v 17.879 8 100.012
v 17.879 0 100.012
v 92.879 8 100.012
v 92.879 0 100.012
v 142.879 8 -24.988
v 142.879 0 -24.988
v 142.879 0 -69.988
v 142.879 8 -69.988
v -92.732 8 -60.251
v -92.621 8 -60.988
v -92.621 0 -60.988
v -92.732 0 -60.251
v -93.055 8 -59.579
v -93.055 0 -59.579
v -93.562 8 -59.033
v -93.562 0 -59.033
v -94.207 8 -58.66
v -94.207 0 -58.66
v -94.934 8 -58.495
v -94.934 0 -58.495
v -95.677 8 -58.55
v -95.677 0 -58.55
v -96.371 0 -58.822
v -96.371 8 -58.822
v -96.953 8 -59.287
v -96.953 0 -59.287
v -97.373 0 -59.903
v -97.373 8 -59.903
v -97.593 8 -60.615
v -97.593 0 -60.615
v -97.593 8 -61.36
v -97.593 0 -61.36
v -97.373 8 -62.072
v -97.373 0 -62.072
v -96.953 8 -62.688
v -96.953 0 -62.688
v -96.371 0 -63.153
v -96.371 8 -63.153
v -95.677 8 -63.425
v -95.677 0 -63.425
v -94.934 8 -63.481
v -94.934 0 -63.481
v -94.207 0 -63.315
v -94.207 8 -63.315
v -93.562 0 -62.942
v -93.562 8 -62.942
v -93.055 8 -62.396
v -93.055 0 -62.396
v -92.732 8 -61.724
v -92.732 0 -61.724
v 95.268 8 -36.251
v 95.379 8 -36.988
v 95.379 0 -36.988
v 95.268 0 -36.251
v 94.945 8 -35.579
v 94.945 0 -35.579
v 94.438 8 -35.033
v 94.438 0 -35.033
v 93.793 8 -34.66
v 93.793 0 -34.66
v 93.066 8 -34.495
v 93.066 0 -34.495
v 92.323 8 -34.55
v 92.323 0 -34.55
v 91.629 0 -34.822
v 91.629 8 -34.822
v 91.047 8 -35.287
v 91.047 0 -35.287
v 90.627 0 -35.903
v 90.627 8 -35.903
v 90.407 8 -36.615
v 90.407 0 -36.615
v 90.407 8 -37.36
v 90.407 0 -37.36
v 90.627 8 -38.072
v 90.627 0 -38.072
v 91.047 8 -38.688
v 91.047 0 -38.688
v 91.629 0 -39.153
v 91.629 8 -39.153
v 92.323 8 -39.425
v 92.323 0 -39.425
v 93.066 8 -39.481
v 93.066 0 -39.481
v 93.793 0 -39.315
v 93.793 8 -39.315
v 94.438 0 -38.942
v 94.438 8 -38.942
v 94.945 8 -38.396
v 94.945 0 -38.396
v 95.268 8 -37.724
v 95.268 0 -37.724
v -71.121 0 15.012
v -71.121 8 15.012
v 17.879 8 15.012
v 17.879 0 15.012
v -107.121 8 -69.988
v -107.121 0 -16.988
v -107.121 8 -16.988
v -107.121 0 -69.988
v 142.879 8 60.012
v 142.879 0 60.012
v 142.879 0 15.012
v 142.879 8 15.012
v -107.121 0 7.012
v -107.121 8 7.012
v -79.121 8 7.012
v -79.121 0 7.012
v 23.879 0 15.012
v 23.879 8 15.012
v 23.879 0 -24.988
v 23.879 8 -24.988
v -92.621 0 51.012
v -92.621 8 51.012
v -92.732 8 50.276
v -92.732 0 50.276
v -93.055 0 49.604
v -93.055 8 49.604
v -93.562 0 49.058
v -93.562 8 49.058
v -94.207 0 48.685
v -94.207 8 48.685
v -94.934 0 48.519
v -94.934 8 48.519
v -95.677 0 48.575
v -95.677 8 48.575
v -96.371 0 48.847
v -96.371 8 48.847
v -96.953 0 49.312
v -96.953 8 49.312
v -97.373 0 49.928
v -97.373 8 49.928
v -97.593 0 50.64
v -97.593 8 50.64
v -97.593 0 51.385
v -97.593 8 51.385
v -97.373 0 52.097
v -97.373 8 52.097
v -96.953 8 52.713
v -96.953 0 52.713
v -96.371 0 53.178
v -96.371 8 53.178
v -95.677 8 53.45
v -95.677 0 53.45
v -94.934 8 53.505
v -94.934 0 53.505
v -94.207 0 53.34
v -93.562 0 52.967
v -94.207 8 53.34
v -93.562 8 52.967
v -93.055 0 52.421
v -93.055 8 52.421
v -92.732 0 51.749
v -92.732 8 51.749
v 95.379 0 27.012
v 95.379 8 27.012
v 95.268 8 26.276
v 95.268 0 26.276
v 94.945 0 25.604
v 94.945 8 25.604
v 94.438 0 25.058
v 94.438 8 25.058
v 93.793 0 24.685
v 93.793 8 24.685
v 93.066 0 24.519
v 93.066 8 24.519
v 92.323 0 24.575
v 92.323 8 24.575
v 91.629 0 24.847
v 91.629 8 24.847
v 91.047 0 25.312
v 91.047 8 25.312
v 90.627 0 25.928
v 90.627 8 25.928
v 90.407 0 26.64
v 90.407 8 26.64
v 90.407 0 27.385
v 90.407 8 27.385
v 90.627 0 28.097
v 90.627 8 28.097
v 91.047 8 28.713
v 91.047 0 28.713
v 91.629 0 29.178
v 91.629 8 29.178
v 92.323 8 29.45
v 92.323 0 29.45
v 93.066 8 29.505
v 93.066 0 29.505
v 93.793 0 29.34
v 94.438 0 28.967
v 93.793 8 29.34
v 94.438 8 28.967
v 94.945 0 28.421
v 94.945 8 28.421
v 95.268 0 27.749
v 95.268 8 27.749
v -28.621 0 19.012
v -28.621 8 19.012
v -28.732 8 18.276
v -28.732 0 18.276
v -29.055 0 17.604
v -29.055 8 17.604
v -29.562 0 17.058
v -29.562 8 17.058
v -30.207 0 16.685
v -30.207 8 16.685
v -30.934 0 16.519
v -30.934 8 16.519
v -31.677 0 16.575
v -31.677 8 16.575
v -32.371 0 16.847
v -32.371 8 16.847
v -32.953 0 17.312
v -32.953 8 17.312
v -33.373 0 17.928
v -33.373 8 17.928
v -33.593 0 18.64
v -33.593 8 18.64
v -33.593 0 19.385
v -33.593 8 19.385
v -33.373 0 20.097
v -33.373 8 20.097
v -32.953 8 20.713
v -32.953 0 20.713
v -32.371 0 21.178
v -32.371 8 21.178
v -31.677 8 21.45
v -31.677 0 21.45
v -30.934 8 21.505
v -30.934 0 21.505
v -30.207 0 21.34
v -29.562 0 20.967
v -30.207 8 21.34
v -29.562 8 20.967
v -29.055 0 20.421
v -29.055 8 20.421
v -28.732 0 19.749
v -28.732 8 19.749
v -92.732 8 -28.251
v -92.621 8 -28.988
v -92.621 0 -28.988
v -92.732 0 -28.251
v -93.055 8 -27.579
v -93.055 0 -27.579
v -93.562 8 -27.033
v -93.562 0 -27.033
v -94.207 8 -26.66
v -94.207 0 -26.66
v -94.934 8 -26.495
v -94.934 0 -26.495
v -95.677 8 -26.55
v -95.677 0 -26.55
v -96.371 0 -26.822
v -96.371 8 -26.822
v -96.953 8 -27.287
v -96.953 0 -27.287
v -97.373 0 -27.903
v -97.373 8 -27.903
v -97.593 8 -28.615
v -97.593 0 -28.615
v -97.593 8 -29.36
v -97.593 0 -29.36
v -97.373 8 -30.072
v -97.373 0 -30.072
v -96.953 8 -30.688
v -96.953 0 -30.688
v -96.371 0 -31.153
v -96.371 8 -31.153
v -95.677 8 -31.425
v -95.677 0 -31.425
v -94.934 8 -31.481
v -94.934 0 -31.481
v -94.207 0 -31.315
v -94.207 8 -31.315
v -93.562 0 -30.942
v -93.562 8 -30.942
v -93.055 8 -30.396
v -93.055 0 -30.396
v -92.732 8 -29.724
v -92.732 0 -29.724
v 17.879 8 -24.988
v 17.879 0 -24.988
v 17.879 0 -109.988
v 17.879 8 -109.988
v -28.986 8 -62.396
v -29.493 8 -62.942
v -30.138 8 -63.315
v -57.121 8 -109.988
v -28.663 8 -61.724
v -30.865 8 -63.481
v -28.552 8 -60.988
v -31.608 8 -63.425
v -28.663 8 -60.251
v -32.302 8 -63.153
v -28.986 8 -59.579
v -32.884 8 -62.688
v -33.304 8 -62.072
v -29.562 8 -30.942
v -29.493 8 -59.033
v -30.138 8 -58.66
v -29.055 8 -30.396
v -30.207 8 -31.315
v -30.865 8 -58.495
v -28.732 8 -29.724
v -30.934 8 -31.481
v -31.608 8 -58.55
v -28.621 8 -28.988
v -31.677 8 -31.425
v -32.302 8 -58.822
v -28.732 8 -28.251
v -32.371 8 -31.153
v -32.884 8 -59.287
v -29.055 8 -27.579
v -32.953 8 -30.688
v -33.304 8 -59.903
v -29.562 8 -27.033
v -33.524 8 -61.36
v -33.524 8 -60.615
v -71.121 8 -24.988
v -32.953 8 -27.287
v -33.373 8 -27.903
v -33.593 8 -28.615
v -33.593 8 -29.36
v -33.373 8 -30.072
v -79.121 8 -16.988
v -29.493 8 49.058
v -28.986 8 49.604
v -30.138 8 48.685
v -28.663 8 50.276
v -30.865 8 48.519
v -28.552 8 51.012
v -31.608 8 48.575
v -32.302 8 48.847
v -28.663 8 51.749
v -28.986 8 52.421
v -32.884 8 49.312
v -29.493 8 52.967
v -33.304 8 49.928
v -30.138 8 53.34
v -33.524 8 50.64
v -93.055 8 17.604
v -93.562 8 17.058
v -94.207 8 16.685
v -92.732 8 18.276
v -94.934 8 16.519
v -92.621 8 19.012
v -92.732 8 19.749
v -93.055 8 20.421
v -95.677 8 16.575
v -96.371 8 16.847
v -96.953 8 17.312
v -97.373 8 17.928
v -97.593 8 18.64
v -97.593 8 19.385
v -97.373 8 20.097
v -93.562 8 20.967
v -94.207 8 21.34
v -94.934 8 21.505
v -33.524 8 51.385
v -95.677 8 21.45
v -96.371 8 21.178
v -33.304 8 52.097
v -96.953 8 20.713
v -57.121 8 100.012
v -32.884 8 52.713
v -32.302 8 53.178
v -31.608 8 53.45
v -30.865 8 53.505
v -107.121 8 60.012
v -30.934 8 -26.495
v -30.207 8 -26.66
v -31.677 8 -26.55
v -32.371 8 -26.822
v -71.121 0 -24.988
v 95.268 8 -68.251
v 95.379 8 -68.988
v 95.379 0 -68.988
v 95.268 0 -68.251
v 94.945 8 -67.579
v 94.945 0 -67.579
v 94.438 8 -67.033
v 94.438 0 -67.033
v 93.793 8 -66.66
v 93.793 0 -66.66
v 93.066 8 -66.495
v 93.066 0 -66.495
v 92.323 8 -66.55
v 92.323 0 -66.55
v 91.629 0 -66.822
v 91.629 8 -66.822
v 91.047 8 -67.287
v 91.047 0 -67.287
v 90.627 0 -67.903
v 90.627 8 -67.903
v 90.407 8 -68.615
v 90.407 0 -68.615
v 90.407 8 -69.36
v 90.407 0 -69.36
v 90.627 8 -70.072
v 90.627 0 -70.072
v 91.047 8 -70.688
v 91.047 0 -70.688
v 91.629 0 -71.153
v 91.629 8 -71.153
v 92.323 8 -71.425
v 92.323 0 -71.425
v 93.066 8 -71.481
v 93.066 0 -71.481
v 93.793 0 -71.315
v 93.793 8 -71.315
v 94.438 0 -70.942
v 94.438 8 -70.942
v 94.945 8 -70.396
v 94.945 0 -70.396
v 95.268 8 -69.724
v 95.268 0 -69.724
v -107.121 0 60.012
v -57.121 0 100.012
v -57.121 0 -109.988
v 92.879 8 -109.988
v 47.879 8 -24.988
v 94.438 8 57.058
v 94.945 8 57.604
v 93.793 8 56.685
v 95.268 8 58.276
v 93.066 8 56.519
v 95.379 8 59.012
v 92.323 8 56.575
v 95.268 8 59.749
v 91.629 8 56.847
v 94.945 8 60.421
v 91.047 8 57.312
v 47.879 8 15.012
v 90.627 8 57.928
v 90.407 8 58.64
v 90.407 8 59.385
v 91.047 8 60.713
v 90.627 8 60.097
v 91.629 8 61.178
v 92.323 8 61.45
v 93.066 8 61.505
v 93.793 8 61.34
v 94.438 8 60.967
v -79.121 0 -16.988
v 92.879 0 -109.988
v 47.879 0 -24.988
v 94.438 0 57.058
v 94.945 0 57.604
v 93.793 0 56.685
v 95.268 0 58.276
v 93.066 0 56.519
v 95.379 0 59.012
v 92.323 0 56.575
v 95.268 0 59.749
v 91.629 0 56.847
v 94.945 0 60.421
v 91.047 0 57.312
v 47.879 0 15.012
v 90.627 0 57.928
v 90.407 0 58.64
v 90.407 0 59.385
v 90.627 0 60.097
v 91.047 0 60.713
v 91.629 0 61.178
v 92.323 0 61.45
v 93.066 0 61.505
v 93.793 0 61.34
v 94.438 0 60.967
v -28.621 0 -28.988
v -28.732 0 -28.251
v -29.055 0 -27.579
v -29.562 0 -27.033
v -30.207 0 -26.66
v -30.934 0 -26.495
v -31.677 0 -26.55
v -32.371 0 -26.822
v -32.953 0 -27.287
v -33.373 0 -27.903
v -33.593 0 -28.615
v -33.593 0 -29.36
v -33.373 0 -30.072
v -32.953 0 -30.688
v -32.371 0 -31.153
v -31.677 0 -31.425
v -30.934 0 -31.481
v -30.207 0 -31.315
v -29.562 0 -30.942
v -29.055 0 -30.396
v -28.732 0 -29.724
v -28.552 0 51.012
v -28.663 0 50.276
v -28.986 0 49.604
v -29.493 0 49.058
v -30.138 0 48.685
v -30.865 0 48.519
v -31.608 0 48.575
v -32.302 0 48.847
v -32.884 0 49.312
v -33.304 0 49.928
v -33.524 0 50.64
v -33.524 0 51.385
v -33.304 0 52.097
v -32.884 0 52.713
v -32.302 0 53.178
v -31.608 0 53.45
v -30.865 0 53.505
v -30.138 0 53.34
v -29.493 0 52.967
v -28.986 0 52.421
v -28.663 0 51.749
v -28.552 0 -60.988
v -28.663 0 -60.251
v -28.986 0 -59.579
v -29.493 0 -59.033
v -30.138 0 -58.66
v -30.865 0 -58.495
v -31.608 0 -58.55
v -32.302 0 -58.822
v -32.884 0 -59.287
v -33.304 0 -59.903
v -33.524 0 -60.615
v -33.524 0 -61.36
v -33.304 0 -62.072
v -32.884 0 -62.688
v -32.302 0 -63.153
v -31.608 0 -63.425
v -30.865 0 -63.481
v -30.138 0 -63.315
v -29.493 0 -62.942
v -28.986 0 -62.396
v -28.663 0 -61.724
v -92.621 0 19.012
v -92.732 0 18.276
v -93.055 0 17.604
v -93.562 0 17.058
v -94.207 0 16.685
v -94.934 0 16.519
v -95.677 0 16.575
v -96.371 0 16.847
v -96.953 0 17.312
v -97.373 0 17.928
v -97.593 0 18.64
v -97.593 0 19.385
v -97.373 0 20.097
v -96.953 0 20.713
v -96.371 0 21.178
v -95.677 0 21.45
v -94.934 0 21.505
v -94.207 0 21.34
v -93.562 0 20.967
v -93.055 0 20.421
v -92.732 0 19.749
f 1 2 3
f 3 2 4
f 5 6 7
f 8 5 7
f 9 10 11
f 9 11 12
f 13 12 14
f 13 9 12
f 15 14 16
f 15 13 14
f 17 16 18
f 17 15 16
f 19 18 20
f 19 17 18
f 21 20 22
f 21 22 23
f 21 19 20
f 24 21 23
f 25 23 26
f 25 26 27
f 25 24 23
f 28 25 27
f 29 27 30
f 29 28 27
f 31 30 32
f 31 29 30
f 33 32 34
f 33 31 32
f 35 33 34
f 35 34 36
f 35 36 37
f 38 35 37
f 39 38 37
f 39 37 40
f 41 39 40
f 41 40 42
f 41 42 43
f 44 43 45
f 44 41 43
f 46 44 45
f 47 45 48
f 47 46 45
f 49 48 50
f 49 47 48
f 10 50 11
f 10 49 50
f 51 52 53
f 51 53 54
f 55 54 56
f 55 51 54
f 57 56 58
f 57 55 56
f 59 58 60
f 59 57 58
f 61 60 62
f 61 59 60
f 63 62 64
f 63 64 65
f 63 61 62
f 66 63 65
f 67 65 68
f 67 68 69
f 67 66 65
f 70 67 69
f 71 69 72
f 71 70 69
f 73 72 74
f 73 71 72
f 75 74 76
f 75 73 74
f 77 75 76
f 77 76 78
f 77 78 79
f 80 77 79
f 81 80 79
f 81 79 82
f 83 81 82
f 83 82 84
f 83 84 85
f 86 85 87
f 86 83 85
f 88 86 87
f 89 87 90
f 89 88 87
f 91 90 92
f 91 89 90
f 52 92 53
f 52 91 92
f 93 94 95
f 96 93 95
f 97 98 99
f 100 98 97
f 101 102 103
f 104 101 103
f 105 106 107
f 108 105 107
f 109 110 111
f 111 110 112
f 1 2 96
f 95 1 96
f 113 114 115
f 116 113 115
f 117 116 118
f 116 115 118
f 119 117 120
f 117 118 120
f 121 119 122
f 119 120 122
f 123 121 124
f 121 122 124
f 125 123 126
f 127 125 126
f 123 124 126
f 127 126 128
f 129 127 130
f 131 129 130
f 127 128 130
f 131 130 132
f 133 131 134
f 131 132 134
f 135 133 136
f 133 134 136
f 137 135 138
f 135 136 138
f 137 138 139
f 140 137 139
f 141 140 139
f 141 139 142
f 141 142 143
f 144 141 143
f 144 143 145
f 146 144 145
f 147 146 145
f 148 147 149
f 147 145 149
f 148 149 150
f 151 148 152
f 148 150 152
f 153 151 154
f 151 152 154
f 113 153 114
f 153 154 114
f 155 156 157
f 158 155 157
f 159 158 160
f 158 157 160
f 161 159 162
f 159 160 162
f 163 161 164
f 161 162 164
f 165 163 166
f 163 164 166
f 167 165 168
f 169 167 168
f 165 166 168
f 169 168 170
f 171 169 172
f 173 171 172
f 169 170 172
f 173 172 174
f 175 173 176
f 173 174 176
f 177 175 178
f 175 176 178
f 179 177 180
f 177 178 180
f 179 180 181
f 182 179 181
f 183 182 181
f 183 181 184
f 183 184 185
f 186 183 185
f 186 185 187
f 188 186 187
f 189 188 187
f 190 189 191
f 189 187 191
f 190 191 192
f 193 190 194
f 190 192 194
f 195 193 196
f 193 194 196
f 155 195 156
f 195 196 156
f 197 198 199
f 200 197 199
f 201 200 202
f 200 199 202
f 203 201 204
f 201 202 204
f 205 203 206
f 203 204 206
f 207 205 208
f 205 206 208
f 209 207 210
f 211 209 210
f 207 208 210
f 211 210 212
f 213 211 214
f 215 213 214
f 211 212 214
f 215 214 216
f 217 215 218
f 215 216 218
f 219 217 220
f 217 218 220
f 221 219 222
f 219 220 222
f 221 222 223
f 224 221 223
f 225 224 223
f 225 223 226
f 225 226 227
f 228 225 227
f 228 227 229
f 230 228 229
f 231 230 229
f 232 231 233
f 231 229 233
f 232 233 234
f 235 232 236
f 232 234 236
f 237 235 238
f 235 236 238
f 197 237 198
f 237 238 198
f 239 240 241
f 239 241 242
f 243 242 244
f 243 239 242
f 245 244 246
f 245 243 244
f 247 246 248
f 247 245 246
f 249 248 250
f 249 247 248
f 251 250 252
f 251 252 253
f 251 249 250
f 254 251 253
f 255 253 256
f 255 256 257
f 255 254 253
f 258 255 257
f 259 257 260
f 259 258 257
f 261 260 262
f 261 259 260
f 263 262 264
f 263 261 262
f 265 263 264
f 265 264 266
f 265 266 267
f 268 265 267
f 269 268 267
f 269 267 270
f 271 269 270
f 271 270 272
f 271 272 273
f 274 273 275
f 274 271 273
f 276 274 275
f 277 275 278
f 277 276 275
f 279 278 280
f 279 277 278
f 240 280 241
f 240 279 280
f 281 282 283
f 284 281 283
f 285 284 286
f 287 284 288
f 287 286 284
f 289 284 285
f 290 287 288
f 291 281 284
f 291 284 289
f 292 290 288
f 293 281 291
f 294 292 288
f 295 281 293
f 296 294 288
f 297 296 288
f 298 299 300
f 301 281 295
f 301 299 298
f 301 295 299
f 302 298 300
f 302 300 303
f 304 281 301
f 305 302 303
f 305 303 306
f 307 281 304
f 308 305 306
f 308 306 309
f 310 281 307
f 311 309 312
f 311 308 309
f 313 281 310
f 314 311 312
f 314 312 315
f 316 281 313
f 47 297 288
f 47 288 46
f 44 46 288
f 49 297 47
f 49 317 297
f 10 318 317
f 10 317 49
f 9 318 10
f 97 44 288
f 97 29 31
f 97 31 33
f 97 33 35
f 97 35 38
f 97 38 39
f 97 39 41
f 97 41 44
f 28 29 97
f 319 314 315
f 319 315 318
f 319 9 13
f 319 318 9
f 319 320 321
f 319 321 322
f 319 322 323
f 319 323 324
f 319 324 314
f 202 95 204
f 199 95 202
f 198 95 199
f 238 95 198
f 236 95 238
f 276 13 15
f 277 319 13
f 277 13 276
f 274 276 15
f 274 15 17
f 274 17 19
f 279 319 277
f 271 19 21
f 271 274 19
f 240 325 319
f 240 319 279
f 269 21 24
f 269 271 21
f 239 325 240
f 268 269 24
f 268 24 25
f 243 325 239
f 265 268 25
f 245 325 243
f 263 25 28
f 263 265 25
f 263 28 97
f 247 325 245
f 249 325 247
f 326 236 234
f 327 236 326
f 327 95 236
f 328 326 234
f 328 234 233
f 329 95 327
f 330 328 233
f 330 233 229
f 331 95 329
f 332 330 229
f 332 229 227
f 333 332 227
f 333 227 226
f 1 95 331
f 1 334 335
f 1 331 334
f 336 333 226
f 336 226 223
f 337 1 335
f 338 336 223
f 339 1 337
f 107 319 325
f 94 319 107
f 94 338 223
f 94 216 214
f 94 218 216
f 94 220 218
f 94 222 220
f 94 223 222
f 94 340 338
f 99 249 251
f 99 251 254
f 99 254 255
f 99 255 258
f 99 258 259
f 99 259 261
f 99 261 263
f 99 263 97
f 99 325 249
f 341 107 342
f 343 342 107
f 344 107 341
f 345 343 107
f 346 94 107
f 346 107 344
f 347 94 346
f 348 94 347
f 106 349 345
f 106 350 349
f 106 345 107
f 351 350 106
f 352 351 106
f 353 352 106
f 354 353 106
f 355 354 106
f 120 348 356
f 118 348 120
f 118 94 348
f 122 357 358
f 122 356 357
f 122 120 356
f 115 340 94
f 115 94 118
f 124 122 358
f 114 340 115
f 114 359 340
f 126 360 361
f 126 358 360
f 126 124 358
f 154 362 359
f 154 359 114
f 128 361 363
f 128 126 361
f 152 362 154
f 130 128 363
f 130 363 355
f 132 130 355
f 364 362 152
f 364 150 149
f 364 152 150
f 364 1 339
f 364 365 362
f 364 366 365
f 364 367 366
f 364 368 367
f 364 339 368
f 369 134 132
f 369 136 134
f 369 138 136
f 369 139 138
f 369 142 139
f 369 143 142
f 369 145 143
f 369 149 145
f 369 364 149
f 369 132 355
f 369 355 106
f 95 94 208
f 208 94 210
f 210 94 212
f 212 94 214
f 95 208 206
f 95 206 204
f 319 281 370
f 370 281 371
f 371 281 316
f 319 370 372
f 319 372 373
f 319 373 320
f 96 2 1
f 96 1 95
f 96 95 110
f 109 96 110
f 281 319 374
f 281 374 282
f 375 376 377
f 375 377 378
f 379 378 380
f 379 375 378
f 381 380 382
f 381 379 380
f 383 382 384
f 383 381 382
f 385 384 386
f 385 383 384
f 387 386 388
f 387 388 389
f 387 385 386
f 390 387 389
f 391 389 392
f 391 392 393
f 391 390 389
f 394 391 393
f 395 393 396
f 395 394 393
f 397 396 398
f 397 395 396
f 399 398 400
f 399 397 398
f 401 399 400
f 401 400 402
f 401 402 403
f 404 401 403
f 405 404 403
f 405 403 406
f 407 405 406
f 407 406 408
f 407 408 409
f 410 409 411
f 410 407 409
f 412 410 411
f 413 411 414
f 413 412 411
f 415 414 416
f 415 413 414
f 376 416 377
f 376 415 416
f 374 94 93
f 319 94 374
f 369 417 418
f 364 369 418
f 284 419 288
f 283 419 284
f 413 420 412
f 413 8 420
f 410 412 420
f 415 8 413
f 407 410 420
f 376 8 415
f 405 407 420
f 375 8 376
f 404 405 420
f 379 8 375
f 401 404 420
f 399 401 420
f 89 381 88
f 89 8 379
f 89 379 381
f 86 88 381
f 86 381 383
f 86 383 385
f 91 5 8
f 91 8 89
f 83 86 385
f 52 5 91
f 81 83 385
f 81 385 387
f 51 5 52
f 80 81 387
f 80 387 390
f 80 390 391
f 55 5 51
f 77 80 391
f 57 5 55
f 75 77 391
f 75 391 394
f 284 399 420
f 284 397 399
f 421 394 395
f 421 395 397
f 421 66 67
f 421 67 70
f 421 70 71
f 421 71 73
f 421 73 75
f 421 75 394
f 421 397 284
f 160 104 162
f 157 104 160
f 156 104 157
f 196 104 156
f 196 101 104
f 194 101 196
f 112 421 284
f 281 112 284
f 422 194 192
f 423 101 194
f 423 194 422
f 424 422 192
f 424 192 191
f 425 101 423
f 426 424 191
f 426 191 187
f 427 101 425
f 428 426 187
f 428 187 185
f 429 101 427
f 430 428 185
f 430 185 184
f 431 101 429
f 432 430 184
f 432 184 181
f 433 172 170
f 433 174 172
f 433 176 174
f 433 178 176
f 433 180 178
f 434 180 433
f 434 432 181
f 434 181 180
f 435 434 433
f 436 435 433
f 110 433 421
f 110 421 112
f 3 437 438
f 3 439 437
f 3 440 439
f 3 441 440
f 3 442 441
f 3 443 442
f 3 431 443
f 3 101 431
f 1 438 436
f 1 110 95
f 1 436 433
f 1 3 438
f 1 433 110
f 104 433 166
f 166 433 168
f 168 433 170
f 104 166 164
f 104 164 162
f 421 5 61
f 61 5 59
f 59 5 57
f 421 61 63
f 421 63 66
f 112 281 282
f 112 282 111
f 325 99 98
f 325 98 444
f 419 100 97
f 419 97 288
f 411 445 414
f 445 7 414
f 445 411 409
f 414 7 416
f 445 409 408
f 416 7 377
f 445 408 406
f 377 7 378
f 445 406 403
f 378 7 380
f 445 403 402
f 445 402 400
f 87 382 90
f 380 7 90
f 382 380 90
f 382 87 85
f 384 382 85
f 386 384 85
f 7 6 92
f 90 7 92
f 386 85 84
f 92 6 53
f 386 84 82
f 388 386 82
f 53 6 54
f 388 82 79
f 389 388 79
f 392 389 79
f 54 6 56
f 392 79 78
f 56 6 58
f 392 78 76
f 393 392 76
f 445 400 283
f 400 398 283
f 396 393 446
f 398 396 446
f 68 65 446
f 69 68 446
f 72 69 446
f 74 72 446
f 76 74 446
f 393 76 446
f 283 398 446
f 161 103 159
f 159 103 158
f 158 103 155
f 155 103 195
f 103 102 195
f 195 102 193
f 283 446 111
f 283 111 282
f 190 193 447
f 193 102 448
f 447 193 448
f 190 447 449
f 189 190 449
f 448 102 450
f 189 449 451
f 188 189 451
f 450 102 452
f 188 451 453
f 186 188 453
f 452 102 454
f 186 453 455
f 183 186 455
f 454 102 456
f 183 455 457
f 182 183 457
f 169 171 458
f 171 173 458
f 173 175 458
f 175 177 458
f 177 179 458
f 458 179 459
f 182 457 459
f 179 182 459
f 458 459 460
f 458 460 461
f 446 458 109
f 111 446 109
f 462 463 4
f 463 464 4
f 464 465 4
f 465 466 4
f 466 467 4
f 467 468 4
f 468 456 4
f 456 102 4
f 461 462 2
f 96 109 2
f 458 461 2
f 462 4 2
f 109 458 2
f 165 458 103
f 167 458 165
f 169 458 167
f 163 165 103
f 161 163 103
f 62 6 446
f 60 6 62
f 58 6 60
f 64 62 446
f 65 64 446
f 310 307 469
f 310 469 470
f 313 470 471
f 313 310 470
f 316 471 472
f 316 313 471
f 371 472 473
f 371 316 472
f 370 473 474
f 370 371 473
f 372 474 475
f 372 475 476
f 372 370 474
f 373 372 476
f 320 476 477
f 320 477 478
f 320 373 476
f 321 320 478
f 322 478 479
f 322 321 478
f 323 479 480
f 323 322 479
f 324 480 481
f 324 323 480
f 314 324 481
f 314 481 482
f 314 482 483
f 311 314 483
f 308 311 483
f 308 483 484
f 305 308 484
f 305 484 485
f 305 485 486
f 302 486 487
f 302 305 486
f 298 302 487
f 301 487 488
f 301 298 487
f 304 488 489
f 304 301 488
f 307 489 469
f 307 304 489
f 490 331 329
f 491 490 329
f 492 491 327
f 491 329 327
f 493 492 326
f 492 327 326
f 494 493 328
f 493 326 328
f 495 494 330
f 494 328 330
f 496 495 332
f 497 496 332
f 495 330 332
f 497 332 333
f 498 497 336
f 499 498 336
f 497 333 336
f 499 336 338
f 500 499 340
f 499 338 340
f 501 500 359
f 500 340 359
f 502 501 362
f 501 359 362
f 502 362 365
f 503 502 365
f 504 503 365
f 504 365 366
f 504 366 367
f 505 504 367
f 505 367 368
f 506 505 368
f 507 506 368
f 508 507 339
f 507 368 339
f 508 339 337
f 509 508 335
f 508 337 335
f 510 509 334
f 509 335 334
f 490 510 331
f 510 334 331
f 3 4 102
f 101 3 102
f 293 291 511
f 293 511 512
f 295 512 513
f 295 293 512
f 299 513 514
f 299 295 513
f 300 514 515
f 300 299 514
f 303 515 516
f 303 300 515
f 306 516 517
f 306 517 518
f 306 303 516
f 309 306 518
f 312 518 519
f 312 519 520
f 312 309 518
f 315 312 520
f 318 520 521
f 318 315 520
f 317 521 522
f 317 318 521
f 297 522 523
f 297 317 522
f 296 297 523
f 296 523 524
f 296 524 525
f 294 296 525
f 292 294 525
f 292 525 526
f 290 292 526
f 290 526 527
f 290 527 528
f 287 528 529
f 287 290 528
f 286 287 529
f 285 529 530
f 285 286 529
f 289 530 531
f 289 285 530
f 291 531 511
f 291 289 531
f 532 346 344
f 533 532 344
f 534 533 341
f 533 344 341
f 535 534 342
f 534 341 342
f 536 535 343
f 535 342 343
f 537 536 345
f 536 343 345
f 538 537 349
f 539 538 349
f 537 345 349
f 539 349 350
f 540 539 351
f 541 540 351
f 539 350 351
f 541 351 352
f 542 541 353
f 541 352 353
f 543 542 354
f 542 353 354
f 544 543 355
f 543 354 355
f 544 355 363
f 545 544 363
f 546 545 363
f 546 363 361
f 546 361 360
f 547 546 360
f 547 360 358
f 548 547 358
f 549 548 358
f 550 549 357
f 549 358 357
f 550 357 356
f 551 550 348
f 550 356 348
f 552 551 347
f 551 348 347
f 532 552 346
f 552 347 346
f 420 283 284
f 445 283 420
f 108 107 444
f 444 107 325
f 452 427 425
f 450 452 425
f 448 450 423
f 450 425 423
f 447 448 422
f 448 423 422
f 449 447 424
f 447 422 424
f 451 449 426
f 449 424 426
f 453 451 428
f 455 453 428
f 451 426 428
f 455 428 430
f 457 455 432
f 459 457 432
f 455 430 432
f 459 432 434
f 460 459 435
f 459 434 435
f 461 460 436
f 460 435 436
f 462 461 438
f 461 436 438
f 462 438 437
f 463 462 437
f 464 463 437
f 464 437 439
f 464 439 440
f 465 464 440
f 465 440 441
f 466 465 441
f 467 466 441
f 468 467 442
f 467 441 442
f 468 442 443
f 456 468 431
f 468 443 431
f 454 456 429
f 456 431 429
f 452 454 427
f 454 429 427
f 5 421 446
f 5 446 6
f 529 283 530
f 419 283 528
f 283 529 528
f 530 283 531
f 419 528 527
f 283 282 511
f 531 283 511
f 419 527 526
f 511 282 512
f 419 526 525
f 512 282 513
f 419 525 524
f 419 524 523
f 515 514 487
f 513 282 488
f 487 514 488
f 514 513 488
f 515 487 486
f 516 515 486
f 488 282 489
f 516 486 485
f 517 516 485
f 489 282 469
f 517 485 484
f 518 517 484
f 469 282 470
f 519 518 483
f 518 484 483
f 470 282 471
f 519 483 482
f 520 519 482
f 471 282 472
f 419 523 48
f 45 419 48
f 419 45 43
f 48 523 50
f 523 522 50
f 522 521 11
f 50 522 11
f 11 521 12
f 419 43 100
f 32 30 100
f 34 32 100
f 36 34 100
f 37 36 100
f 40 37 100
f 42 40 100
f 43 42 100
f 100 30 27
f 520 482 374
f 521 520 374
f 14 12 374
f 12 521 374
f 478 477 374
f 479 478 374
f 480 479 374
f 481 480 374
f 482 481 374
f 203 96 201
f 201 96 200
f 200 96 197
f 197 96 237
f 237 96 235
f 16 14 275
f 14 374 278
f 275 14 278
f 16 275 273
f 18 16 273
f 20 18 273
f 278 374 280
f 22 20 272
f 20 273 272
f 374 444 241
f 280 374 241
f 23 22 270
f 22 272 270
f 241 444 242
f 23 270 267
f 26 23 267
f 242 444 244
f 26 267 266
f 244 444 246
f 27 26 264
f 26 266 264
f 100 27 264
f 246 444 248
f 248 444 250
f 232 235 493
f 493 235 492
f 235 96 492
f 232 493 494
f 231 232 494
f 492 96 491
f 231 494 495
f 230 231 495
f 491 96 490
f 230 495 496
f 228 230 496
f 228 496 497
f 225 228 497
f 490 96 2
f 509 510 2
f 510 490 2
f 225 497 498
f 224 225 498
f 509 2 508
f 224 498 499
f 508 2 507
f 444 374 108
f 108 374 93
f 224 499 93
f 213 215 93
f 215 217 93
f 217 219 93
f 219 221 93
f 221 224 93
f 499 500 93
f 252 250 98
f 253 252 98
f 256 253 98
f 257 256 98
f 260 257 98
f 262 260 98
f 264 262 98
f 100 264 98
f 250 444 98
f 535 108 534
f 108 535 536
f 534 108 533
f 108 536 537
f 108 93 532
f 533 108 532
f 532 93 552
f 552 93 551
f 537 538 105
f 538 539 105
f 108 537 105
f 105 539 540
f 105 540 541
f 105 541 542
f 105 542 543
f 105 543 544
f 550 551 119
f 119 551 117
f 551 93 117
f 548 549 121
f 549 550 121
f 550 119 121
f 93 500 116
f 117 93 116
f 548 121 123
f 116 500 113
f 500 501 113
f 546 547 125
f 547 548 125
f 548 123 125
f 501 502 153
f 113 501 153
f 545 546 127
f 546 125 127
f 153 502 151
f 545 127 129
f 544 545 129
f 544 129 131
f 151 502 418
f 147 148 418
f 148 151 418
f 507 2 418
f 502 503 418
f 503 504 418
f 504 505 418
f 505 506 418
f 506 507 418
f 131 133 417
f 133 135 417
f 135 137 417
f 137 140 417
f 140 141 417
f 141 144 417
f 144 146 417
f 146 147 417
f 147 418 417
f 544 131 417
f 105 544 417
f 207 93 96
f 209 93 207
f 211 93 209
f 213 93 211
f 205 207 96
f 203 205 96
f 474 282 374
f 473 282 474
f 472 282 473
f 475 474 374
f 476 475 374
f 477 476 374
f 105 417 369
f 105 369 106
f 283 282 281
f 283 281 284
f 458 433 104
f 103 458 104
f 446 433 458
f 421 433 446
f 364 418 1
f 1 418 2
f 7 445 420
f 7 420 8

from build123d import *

# Parameters (mm, degrees)
SKETCH1_W           = 250
SKETCH1_H           = 130
BOSS_EXTRUDE1_DEPTH = 8
SKETCH2_W           = 95
SKETCH2_H           = 40
CUT_EXTRUDE1_DEPTH  = 8
SKETCH3_W           = 28
SKETCH3_H           = 24
CUT_EXTRUDE2_DEPTH  = 8
SKETCH4_W           = 95
SKETCH4_H           = 40
CUT_EXTRUDE3_DEPTH  = 8
BOSS_EXTRUDE2_DEPTH = 8
SKETCH6_R           = 2.5
CUT_EXTRUDE4_DEPTH  = 8
SKETCH7_R           = 2.5
CUT_EXTRUDE5_DEPTH  = 8
SKETCH8_R           = 2.5
CUT_EXTRUDE6_DEPTH  = 8


with BuildPart() as part:
    # Sketch1 → Boss-Extrude1 (new body)
    with BuildSketch(Plane(origin=(0, 0, 0), x_dir=(1, 0, 0), z_dir=(0, 1, 0))):
        with Locations((17.879353234, 4.987562189)):
            Rectangle(SKETCH1_W, SKETCH1_H)
    extrude(amount=BOSS_EXTRUDE1_DEPTH)

    # Sketch2 → Cut-Extrude1 (cut)
    with BuildSketch(Plane(origin=(0, 8, 0), x_dir=(1, 0, 0), z_dir=(0, 1, 0))):
        with Locations((95.379353234, 4.987562189)):
            Rectangle(SKETCH2_W, SKETCH2_H)
    extrude(amount=-CUT_EXTRUDE1_DEPTH, mode=Mode.SUBTRACT)

    # Sketch3 → Cut-Extrude2 (cut)
    with BuildSketch(Plane(origin=(0, 8, 0), x_dir=(1, 0, 0), z_dir=(0, 1, 0))):
        with Locations((-93.120646766, 4.987562189)):
            Rectangle(SKETCH3_W, SKETCH3_H)
    extrude(amount=-CUT_EXTRUDE2_DEPTH, mode=Mode.SUBTRACT)

    # Sketch4 → Cut-Extrude3 (cut)
    with BuildSketch(Plane(origin=(0, 8, 0), x_dir=(1, 0, 0), z_dir=(0, 1, 0))):
        with Locations((-23.620646766, 4.987562189)):
            Rectangle(SKETCH4_W, SKETCH4_H)
    extrude(amount=-CUT_EXTRUDE3_DEPTH, mode=Mode.SUBTRACT)

    # Sketch5 → Boss-Extrude2 (add)
    with BuildSketch(Plane.XZ):
        Polygon((-107.120646766, 60.012437811), (-57.120646766, 100.012437811), (92.879353234, 100.012437811), (142.879353234, 60.012437811), align=None)
        Polygon((-107.120646766, -69.987562189), (-57.120646766, -109.987562189), (92.879353234, -109.987562189), (142.879353234, -69.987562189), align=None)
    extrude(amount=-BOSS_EXTRUDE2_DEPTH)

    # Sketch6 → Cut-Extrude4 (cut)
    with BuildSketch(Plane(origin=(0, 8, 0), x_dir=(1, 0, 0), z_dir=(0, 1, 0))):
        with Locations((92.879353234, -27.012437811)):
            Circle(SKETCH6_R)
        with Locations((92.879353234, -59.012437811)):
            Circle(SKETCH6_R)
    cut_extrude4 = extrude(amount=-CUT_EXTRUDE4_DEPTH, mode=Mode.SUBTRACT)

    # Sketch7 → Cut-Extrude5 (cut)
    with BuildSketch(Plane(origin=(0, 8, 0), x_dir=(1, 0, 0), z_dir=(0, 1, 0))):
        with Locations((-95.120646766, -19.012437811)):
            Circle(SKETCH7_R)
        with Locations((-95.120646766, -51.012437811)):
            Circle(SKETCH7_R)
    cut_extrude5 = extrude(amount=-CUT_EXTRUDE5_DEPTH, mode=Mode.SUBTRACT)

    # Mirror1: Cut-Extrude4, Cut-Extrude5 across plane
    add(cut_extrude4.mirror(Plane.XY.offset(-4.987562189)), mode=Mode.SUBTRACT)
    add(cut_extrude5.mirror(Plane.XY.offset(-4.987562189)), mode=Mode.SUBTRACT)

    # Sketch8 → Cut-Extrude6 (cut)
    with BuildSketch(Plane(origin=(0, 8, 0), x_dir=(1, 0, 0), z_dir=(0, 1, 0))):
        with Locations((-31.120646766, -19.012437811)):
            Circle(SKETCH8_R)
        with Locations((-31.051544466, -51.012437811)):
            Circle(SKETCH8_R)
    cut_extrude6 = extrude(amount=-CUT_EXTRUDE6_DEPTH, mode=Mode.SUBTRACT)

    # Mirror2: Cut-Extrude6 across plane
    add(cut_extrude6.mirror(Plane.XY.offset(-4.987562189)), mode=Mode.SUBTRACT)


with BuildPart() as body_2:
    # Split1: the piece on the far side of the plane
    add(part.part)
    split(bisect_by=Plane(origin=(17.879353234, 0, 0), x_dir=(0, 0, -1), z_dir=(-1, 0, 0)), keep=Keep.BOTTOM)


with BuildPart() as part_1:
    add(part.part)

    # Split1
    split(bisect_by=Plane(origin=(17.879353234, 0, 0), x_dir=(0, 0, -1), z_dir=(-1, 0, 0)), keep=Keep.TOP)


solid = Compound([body_2.part, part_1.part])
